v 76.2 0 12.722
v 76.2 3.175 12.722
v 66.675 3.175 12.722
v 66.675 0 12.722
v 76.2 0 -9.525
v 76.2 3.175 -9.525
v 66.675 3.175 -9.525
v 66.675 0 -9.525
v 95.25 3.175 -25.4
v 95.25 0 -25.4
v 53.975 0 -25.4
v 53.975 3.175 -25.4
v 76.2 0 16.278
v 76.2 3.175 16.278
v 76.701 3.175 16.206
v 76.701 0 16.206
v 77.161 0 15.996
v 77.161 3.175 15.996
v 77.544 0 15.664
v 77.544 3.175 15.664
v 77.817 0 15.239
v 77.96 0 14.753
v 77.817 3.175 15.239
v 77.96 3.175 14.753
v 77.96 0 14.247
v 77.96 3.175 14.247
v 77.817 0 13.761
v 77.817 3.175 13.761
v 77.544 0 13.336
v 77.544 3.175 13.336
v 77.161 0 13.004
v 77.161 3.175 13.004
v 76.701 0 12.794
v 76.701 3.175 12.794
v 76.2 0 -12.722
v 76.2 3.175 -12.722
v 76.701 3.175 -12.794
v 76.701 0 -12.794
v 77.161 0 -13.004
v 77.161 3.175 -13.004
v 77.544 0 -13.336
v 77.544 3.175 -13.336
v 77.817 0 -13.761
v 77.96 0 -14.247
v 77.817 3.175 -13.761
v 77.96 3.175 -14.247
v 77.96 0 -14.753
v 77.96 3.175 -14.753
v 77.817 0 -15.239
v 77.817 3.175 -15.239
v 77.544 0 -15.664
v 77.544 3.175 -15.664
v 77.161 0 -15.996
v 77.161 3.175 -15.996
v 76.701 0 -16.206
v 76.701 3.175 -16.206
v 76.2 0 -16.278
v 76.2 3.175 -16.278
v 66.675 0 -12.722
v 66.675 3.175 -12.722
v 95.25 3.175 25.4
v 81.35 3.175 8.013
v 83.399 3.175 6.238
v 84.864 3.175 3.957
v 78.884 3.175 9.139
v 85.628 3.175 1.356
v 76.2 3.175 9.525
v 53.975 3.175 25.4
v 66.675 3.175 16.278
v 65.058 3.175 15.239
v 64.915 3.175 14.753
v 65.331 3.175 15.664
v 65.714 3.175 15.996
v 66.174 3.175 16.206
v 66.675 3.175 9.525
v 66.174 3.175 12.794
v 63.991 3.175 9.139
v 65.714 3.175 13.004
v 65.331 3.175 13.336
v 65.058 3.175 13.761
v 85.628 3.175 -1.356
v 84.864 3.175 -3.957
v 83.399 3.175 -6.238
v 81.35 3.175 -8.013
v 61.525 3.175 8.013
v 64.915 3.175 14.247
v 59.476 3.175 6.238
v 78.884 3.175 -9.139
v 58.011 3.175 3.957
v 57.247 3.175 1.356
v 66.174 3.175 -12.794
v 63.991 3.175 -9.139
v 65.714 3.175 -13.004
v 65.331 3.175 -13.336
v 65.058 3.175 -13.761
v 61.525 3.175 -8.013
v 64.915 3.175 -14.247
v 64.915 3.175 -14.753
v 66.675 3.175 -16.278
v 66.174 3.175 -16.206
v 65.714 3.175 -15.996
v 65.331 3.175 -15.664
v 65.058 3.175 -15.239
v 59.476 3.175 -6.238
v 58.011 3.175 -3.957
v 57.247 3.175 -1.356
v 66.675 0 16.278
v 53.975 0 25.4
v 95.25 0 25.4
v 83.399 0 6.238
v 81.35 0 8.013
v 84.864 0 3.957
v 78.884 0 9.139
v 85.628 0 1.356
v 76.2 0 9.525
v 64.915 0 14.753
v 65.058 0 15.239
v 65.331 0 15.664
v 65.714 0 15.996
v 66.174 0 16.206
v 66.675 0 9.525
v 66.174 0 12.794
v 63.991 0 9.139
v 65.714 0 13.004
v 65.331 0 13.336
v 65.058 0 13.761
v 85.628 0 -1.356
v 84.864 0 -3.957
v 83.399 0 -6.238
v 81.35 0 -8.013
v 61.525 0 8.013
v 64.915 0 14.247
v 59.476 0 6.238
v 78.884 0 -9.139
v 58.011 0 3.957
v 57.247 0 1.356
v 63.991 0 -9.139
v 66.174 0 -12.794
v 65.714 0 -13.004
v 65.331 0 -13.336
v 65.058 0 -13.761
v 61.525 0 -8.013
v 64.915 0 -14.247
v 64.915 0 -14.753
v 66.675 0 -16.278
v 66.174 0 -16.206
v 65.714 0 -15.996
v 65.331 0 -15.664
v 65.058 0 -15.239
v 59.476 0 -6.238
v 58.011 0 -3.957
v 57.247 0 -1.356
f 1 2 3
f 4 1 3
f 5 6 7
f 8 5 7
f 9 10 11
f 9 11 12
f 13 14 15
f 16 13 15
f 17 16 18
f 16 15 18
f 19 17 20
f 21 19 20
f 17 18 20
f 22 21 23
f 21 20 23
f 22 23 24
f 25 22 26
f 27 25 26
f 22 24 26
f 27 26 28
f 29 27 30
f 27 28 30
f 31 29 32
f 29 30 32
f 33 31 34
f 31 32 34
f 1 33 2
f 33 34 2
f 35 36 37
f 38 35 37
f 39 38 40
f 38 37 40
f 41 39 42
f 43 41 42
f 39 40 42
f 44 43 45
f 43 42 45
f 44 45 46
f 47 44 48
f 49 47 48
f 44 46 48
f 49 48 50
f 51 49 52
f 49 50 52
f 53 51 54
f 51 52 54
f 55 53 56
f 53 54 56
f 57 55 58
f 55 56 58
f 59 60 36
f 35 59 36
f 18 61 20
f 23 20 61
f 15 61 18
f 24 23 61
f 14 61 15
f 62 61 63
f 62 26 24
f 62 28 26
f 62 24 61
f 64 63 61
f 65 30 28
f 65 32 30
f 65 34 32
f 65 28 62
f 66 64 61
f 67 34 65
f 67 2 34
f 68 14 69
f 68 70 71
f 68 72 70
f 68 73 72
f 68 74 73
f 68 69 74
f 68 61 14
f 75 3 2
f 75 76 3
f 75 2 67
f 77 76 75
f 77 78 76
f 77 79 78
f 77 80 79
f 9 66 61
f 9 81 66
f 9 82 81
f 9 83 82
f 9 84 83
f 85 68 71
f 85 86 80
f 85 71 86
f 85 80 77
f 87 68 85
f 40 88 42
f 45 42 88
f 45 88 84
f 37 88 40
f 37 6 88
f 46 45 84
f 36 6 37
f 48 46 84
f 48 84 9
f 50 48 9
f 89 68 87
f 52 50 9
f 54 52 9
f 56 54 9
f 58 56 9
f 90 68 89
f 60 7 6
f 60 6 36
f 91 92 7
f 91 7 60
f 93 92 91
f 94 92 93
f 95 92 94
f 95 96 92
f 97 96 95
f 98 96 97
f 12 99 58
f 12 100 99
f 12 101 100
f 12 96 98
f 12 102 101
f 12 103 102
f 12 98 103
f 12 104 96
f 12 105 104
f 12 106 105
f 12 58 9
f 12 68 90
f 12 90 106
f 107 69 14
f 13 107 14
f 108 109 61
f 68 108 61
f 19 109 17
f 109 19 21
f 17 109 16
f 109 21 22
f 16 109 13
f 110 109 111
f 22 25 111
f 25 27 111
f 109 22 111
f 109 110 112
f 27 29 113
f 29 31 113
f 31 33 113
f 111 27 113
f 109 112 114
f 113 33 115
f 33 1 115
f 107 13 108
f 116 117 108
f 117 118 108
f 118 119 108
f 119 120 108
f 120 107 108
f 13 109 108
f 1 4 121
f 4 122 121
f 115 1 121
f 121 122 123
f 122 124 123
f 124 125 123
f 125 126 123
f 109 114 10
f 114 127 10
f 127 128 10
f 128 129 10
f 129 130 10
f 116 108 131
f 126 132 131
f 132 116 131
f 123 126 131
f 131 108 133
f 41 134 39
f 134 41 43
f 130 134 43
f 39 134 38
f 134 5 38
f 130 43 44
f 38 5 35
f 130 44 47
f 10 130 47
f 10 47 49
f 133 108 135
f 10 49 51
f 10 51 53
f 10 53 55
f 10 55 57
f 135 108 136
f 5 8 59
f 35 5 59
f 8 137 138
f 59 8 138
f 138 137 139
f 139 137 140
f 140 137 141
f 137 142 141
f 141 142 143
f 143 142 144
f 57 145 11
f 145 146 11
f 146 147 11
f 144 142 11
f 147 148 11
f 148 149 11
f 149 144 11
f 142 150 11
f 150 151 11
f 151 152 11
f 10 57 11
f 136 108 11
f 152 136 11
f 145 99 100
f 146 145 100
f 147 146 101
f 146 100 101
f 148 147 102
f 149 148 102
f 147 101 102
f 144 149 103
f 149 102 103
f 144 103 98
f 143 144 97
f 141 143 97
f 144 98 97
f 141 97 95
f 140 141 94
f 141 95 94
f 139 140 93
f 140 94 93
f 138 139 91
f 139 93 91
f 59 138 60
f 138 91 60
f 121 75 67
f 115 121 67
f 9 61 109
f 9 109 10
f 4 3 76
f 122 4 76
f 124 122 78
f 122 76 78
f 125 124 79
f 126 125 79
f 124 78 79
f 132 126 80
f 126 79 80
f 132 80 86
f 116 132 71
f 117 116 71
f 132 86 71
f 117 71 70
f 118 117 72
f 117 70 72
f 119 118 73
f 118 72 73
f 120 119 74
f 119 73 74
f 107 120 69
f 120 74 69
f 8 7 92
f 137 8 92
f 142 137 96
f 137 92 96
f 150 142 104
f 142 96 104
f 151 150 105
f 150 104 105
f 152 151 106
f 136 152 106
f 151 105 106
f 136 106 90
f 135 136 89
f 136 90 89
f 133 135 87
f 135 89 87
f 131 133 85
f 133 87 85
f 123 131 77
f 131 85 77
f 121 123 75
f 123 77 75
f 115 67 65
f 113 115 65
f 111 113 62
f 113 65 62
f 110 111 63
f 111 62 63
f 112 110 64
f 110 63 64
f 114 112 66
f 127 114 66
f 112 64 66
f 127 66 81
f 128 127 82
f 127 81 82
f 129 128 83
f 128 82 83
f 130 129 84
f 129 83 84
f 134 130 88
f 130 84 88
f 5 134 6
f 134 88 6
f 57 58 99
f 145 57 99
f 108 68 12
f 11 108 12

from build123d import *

# Parameters (mm, degrees)
SKETCH1_W           = 177.8
SKETCH1_H           = 50.8
BOSS_EXTRUDE1_DEPTH = 3.175
CUT_EXTRUDE1_DEPTH  = 3.175
SKETCH6_W           = 142.875
SKETCH6_H           = 50.8
CUT_EXTRUDE3_DEPTH  = 3.175
SKETCH8_W           = 50.8
SKETCH8_H           = 3.175
BOSS_EXTRUDE2_DEPTH = 6.35


with BuildPart() as part:
    # Sketch1 → Boss-Extrude1 (new body)
    with BuildSketch(Plane(origin=(0, 0, 0), x_dir=(1, 0, 0), z_dir=(0, 1, 0))):
        Rectangle(SKETCH1_W, SKETCH1_H)
    extrude(amount=BOSS_EXTRUDE1_DEPTH)

    # Sketch2 → Cut-Extrude1 (cut)
    with BuildSketch(Plane(origin=(0, 3.175, 0), x_dir=(1, 0, 0), z_dir=(0, 1, 0))):
        with BuildLine():
            Line((-76.2, -12.722), (-66.675, -12.722))
            ThreePointArc((-66.675, -12.722), (-64.897, -14.5), (-66.675, -16.278))
            Line((-66.675, -16.278), (-76.2, -16.278))
            ThreePointArc((-76.2, -16.278), (-77.978, -14.5), (-76.2, -12.722))
        make_face()
        with BuildLine():
            Line((-66.675, 12.722), (-76.2, 12.722))
            ThreePointArc((-76.2, 12.722), (-77.978, 14.5), (-76.2, 16.278))
            Line((-76.2, 16.278), (-66.675, 16.278))
            ThreePointArc((-66.675, 16.278), (-64.897, 14.5), (-66.675, 12.722))
        make_face()
        with BuildLine():
            Line((-66.675, -9.525), (-76.2, -9.525))
            ThreePointArc((-76.2, -9.525), (-85.725, 0), (-76.2, 9.525))
            Line((-76.2, 9.525), (-66.675, 9.525))
            ThreePointArc((-66.675, 9.525), (-57.15, 0), (-66.675, -9.525))
        make_face()
    cut_extrude1 = extrude(amount=-CUT_EXTRUDE1_DEPTH, mode=Mode.SUBTRACT)

    # Mirror1: Cut-Extrude1 across plane
    add(cut_extrude1.mirror(Plane(origin=(0, 0, 0), x_dir=(0, 0, 1), z_dir=(1, 0, 0))), mode=Mode.SUBTRACT)

    # Sketch6 → Cut-Extrude3 (cut)
    with BuildSketch(Plane(origin=(0, 3.175, 0), x_dir=(1, 0, 0), z_dir=(0, 1, 0))):
        with Locations((-17.4625, 0)):
            Rectangle(SKETCH6_W, SKETCH6_H)
    extrude(amount=-CUT_EXTRUDE3_DEPTH, mode=Mode.SUBTRACT)

    # Sketch8 → Boss-Extrude2 (add)
    with BuildSketch(Plane(origin=(88.9, 0, 0), x_dir=(0, 0, -1), z_dir=(1, 0, 0))):
        with Locations((0, 1.5875)):
            Rectangle(SKETCH8_W, SKETCH8_H)
    extrude(amount=BOSS_EXTRUDE2_DEPTH)


solid = part.part
